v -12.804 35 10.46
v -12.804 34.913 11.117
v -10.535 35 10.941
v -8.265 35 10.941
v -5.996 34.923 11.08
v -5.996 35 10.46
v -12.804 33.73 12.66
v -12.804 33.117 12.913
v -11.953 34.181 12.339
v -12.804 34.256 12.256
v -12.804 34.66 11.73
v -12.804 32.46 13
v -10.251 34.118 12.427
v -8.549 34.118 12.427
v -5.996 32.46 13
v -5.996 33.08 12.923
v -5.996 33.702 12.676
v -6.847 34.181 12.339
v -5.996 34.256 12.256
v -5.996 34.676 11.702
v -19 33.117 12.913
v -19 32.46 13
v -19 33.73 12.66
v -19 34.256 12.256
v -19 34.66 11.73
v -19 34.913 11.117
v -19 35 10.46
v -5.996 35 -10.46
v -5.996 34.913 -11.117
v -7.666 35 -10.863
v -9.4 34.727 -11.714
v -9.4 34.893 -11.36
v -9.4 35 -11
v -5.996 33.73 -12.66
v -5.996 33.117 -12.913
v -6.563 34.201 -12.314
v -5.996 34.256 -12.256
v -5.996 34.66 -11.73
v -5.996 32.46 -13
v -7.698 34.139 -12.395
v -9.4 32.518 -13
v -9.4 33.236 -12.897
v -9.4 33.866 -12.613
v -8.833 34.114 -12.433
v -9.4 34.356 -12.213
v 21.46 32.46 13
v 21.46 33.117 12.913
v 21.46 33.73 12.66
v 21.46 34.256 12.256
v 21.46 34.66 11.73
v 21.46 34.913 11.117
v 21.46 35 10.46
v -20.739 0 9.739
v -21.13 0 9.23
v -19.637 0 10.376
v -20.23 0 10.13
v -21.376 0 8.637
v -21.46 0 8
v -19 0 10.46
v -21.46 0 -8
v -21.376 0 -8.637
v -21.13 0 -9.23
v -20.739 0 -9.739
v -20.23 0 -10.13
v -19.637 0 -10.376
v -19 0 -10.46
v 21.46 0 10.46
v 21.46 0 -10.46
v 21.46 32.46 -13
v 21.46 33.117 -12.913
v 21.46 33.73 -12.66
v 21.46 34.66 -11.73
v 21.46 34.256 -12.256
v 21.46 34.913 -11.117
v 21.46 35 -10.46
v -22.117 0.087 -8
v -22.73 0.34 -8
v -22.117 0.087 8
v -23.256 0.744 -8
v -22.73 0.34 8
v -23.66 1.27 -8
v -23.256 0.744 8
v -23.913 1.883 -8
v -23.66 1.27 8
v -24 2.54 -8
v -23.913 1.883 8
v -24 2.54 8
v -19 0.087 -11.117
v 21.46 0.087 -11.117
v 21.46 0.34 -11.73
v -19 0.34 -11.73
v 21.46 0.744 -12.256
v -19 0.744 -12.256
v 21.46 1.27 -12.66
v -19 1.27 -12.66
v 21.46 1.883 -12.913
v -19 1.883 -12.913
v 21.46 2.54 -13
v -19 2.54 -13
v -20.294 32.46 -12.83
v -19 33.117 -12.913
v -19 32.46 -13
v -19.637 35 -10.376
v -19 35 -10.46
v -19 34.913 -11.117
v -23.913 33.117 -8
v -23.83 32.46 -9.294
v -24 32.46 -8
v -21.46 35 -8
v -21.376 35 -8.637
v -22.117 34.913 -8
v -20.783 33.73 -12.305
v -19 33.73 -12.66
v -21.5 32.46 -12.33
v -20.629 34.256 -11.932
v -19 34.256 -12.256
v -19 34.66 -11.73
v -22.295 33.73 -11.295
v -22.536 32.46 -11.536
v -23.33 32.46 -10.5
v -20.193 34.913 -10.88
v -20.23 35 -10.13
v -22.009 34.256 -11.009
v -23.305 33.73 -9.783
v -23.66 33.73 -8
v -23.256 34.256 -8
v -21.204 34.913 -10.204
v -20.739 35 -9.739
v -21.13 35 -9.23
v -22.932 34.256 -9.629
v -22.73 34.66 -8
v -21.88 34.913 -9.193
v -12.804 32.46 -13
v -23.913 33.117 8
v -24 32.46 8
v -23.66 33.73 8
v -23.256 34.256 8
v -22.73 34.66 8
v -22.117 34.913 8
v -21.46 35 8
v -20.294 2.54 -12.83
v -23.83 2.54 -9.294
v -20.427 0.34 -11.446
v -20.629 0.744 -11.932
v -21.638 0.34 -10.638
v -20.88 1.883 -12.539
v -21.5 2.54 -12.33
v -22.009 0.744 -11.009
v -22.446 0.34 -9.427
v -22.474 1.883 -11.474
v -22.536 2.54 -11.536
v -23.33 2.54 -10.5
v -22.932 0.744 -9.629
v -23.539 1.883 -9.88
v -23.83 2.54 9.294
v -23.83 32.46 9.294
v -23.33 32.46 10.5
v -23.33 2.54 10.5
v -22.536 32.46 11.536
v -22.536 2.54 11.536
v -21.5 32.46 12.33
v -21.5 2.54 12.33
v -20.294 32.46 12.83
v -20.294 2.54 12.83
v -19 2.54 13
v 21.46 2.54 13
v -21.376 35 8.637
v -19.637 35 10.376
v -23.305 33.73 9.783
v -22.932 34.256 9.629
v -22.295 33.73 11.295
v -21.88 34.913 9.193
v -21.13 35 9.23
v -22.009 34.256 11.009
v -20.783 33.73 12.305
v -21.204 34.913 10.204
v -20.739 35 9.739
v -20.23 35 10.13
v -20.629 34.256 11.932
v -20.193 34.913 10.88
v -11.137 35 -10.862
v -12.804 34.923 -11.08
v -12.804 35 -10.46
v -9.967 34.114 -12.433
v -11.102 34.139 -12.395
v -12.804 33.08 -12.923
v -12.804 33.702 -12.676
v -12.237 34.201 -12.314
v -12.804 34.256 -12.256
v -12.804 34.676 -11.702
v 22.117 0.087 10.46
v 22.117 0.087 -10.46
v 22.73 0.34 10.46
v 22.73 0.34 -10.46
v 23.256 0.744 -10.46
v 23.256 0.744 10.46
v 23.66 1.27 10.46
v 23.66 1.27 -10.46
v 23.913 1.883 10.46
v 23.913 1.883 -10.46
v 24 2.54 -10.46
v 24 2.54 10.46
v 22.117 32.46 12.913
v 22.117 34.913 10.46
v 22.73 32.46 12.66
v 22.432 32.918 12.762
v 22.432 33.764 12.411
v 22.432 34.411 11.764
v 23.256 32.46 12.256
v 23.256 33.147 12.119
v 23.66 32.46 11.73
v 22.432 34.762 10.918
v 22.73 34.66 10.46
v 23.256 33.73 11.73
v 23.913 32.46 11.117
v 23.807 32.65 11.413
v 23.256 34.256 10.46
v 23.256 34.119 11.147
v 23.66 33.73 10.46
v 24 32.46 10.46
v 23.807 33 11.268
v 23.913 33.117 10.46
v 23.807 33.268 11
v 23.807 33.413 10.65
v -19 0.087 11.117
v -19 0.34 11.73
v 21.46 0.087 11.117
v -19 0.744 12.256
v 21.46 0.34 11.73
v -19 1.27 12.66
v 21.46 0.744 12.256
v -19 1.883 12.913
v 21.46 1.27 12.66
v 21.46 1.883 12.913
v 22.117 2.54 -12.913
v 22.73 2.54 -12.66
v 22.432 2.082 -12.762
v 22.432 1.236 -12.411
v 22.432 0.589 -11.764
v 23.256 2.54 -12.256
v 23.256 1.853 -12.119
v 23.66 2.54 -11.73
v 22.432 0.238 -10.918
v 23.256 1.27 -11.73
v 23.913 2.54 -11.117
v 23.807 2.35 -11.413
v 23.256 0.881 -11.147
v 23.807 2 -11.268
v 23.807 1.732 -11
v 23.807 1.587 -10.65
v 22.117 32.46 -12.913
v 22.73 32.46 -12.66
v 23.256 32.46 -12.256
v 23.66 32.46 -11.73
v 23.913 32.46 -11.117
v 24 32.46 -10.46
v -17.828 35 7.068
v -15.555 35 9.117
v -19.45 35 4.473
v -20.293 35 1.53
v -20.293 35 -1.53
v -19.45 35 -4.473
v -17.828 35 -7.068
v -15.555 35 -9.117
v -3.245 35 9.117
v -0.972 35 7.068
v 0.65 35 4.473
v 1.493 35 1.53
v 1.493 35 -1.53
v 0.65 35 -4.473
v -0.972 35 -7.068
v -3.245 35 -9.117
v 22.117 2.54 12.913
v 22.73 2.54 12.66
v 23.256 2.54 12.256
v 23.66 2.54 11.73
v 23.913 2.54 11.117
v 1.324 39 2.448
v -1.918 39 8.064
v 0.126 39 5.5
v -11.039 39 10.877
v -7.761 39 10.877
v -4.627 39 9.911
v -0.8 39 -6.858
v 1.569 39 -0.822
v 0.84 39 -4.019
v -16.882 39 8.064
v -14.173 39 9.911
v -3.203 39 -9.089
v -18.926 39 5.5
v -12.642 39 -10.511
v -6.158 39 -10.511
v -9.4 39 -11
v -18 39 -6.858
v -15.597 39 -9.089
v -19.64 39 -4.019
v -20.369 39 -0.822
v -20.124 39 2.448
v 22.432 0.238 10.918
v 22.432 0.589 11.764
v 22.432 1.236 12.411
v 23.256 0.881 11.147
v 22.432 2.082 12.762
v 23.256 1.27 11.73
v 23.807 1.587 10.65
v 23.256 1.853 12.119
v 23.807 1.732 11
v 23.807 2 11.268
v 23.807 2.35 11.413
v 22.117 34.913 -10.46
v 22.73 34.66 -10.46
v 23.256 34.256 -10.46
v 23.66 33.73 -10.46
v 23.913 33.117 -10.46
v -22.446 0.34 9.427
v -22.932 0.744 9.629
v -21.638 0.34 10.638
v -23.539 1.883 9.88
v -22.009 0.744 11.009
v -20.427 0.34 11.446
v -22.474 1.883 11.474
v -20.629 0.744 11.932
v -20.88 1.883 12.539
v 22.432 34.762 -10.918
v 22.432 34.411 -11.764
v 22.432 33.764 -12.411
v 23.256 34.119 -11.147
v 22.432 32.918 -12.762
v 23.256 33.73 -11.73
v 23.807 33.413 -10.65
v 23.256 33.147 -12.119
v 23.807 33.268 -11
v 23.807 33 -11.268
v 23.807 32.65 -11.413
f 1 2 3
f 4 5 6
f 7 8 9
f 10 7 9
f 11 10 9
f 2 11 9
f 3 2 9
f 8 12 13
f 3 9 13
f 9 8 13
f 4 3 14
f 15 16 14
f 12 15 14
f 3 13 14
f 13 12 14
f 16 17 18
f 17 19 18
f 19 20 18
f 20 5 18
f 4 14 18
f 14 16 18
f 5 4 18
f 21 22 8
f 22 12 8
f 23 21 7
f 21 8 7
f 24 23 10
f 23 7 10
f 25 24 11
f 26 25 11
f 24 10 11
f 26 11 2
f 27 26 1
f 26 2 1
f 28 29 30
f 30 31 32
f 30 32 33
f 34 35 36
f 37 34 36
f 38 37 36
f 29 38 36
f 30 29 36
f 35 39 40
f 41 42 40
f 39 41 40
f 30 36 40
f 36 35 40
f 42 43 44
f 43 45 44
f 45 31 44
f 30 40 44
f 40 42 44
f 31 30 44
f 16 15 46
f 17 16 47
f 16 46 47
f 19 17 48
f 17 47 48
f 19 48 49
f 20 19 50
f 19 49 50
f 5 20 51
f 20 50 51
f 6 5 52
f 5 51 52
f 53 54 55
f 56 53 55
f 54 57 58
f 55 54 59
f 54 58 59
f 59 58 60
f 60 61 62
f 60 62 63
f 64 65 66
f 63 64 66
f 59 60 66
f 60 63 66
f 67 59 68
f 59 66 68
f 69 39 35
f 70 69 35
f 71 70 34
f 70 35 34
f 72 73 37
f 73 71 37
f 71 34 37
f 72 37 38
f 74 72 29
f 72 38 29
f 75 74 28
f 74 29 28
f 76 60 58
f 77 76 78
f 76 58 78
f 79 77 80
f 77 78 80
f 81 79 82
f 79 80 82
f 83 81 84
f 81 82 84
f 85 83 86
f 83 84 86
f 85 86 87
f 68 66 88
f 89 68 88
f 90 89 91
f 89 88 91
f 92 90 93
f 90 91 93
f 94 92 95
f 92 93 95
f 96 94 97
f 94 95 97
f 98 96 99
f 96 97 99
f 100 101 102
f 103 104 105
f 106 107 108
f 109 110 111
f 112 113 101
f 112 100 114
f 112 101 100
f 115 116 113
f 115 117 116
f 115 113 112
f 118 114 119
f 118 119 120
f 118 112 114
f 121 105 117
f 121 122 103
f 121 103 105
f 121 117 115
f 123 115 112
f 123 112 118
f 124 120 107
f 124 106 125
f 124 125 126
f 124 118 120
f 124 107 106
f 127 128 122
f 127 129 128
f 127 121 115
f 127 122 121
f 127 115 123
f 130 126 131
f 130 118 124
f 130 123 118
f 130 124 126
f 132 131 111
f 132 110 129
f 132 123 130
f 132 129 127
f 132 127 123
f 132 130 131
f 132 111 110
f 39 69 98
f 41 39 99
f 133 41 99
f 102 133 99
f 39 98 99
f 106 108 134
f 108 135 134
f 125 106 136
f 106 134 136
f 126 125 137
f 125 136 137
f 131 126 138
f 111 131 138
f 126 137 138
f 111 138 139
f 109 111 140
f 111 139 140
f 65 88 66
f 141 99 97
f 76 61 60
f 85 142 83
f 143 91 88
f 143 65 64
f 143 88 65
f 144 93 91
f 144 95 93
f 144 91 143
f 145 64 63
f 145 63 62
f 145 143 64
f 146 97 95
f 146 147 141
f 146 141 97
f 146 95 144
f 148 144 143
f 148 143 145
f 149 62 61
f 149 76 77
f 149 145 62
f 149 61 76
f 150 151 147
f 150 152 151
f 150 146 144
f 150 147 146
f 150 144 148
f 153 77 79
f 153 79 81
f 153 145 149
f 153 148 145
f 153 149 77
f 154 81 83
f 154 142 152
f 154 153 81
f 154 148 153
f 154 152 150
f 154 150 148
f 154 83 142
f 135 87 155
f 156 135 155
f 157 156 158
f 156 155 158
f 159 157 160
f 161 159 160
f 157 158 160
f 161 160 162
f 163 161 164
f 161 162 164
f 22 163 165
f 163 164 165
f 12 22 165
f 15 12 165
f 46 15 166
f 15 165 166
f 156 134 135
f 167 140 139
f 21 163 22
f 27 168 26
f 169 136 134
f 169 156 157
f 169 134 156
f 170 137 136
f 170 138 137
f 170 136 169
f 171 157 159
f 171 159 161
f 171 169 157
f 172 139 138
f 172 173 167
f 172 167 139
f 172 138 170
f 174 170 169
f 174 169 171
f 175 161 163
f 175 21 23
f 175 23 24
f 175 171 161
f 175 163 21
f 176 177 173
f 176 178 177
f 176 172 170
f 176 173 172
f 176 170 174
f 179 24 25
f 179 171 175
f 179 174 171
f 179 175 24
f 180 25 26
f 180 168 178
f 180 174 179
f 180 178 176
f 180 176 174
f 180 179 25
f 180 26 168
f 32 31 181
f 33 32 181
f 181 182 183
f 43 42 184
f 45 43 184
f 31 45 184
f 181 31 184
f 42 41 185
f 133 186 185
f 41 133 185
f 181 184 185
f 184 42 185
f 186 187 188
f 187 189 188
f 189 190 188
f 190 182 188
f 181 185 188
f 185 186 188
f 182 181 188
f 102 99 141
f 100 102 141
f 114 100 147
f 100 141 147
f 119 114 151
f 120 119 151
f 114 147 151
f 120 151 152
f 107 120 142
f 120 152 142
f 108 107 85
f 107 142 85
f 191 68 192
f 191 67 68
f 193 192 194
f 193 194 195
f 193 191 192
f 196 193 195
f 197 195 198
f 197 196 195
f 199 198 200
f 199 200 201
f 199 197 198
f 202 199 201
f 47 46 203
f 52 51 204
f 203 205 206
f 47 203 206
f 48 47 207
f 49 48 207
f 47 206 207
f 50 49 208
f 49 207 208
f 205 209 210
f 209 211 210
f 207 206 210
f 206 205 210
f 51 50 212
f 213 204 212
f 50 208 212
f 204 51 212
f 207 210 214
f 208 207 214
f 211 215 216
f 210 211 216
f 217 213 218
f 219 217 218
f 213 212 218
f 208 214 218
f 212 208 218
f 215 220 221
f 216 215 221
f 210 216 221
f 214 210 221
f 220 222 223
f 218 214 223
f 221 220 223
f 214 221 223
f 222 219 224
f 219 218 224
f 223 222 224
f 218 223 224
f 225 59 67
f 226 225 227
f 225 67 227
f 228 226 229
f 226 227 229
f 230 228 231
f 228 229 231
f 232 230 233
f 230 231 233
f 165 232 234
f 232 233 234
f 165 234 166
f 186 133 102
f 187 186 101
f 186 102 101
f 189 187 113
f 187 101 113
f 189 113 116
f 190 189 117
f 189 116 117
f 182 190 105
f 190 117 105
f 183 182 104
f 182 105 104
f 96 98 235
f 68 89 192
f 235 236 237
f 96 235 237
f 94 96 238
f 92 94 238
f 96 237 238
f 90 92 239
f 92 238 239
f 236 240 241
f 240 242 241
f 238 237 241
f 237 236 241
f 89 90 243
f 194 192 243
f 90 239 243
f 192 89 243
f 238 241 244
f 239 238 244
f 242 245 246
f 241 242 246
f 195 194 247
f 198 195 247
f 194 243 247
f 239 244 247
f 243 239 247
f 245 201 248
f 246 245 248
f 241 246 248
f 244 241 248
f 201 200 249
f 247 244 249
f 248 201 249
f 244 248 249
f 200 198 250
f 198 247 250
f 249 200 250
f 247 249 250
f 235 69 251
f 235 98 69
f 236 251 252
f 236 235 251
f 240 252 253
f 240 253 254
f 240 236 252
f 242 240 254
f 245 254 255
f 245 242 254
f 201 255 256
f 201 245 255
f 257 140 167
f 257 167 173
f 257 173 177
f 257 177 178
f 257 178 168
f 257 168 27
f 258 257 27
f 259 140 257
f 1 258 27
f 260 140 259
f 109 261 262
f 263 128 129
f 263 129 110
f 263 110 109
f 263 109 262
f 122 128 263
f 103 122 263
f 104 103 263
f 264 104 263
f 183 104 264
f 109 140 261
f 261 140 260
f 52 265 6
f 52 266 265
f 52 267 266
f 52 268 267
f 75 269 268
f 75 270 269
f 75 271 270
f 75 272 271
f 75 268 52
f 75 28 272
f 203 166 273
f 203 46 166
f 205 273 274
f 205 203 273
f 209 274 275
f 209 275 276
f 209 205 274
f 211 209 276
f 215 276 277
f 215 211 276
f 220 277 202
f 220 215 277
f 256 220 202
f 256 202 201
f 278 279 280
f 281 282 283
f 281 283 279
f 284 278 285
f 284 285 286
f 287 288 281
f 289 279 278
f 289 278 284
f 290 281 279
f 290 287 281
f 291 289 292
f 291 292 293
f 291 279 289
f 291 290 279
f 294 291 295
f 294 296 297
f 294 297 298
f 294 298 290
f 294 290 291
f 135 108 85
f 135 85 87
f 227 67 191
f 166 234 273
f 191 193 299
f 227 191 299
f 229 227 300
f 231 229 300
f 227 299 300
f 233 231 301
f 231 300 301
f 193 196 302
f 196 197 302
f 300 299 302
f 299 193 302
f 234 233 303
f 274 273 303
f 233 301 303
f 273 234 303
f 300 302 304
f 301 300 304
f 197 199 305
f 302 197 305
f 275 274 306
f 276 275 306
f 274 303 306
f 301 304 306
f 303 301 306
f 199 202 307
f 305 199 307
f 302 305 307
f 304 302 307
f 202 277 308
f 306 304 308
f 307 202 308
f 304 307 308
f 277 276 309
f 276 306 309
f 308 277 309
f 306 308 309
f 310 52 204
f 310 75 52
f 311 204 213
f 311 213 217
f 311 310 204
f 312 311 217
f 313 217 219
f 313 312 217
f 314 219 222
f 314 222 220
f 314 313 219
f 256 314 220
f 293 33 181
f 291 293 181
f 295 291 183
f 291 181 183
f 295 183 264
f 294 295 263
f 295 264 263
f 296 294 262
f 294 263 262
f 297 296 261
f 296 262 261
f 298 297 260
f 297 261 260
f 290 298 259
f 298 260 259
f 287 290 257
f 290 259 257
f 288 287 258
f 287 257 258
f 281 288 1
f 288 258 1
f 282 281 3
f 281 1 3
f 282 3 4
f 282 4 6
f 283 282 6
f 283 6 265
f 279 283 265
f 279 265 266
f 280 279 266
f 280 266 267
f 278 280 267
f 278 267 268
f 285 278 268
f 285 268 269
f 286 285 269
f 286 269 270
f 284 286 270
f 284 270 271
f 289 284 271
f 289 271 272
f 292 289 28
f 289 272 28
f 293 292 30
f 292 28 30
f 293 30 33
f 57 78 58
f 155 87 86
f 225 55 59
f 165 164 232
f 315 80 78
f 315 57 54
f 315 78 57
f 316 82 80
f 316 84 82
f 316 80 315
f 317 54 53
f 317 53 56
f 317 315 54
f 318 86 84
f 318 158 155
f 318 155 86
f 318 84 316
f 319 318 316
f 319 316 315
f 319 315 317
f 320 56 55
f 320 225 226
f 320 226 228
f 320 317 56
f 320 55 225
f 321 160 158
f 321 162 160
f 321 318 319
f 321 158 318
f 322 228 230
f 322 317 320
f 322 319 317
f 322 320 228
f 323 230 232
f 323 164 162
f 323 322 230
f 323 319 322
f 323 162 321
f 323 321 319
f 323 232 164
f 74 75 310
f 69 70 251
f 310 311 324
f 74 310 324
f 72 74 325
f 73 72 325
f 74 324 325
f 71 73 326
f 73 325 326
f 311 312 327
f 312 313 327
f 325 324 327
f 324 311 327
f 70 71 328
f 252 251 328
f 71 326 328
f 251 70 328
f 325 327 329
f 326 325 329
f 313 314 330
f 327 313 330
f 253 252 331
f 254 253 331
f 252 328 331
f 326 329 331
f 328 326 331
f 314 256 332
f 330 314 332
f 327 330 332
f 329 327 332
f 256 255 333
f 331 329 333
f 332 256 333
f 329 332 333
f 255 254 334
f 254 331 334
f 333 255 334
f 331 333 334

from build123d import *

# Parameters (mm, degrees)
BOSS_EXTRUDE1_DEPTH = 35
SKETCH2_R           = 11
BOSS_EXTRUDE2_DEPTH = 4
FILLET1_R           = 2.54
FILLET2_R           = 2.54


with BuildPart() as part:
    # Sketch1 → Boss-Extrude1 (new body)
    with BuildSketch(Plane(origin=(0, 0, 0), x_dir=(1, 0, 0), z_dir=(0, 1, 0))):
        with BuildLine():
            Line((-19, -13), (24, -13))
            Line((24, -13), (24, 13))
            Line((24, 13), (-19, 13))
            ThreePointArc((-19, 13), (-22.535533906, 11.535533906), (-24, 8))
            Line((-24, 8), (-24, -8))
            ThreePointArc((-24, -8), (-22.535533906, -11.535533906), (-19, -13))
        make_face()
    extrude(amount=BOSS_EXTRUDE1_DEPTH)

    # Sketch2 → Boss-Extrude2 (add)
    with BuildSketch(Plane(origin=(0, 35, 0), x_dir=(1, 0, 0), z_dir=(0, 1, 0))):
        with Locations(Location((-9.4, 0, 0), (0, 0, 90))):
            Circle(SKETCH2_R)
    extrude(amount=BOSS_EXTRUDE2_DEPTH)

    # Fillet1
    fillet1_edges = [part.edges().sort_by_distance(p)[0] for p in [
        (2.5, 35, 13),
        (-22.535533906, 35, 11.535533906),
        (-24, 35, 0),
        (-22.535533906, 35, -11.535533906),
        (-24, 0, 0),
        (-22.535533906, 0, 11.535533906),
        (2.5, 0, 13),
        (2.5, 35, -13),
        (2.5, 0, -13),
        (-22.535533906, 0, -11.535533906),
    ]]
    fillet(fillet1_edges, radius=FILLET1_R)

    # Fillet2
    fillet2_edges = [part.edges().sort_by_distance(p)[0] for p in [
        (24, 17.5, 13),
        (24, 0, 0),
        (24, 17.5, -13),
        (24, 35, 0),
        (24, 34.256051224, 12.256051224),
        (24, 34.256051224, -12.256051224),
        (24, 0.743948776, -12.256051224),
        (24, 0.743948776, 12.256051224),
    ]]
    fillet(fillet2_edges, radius=FILLET2_R)


solid = part.part
